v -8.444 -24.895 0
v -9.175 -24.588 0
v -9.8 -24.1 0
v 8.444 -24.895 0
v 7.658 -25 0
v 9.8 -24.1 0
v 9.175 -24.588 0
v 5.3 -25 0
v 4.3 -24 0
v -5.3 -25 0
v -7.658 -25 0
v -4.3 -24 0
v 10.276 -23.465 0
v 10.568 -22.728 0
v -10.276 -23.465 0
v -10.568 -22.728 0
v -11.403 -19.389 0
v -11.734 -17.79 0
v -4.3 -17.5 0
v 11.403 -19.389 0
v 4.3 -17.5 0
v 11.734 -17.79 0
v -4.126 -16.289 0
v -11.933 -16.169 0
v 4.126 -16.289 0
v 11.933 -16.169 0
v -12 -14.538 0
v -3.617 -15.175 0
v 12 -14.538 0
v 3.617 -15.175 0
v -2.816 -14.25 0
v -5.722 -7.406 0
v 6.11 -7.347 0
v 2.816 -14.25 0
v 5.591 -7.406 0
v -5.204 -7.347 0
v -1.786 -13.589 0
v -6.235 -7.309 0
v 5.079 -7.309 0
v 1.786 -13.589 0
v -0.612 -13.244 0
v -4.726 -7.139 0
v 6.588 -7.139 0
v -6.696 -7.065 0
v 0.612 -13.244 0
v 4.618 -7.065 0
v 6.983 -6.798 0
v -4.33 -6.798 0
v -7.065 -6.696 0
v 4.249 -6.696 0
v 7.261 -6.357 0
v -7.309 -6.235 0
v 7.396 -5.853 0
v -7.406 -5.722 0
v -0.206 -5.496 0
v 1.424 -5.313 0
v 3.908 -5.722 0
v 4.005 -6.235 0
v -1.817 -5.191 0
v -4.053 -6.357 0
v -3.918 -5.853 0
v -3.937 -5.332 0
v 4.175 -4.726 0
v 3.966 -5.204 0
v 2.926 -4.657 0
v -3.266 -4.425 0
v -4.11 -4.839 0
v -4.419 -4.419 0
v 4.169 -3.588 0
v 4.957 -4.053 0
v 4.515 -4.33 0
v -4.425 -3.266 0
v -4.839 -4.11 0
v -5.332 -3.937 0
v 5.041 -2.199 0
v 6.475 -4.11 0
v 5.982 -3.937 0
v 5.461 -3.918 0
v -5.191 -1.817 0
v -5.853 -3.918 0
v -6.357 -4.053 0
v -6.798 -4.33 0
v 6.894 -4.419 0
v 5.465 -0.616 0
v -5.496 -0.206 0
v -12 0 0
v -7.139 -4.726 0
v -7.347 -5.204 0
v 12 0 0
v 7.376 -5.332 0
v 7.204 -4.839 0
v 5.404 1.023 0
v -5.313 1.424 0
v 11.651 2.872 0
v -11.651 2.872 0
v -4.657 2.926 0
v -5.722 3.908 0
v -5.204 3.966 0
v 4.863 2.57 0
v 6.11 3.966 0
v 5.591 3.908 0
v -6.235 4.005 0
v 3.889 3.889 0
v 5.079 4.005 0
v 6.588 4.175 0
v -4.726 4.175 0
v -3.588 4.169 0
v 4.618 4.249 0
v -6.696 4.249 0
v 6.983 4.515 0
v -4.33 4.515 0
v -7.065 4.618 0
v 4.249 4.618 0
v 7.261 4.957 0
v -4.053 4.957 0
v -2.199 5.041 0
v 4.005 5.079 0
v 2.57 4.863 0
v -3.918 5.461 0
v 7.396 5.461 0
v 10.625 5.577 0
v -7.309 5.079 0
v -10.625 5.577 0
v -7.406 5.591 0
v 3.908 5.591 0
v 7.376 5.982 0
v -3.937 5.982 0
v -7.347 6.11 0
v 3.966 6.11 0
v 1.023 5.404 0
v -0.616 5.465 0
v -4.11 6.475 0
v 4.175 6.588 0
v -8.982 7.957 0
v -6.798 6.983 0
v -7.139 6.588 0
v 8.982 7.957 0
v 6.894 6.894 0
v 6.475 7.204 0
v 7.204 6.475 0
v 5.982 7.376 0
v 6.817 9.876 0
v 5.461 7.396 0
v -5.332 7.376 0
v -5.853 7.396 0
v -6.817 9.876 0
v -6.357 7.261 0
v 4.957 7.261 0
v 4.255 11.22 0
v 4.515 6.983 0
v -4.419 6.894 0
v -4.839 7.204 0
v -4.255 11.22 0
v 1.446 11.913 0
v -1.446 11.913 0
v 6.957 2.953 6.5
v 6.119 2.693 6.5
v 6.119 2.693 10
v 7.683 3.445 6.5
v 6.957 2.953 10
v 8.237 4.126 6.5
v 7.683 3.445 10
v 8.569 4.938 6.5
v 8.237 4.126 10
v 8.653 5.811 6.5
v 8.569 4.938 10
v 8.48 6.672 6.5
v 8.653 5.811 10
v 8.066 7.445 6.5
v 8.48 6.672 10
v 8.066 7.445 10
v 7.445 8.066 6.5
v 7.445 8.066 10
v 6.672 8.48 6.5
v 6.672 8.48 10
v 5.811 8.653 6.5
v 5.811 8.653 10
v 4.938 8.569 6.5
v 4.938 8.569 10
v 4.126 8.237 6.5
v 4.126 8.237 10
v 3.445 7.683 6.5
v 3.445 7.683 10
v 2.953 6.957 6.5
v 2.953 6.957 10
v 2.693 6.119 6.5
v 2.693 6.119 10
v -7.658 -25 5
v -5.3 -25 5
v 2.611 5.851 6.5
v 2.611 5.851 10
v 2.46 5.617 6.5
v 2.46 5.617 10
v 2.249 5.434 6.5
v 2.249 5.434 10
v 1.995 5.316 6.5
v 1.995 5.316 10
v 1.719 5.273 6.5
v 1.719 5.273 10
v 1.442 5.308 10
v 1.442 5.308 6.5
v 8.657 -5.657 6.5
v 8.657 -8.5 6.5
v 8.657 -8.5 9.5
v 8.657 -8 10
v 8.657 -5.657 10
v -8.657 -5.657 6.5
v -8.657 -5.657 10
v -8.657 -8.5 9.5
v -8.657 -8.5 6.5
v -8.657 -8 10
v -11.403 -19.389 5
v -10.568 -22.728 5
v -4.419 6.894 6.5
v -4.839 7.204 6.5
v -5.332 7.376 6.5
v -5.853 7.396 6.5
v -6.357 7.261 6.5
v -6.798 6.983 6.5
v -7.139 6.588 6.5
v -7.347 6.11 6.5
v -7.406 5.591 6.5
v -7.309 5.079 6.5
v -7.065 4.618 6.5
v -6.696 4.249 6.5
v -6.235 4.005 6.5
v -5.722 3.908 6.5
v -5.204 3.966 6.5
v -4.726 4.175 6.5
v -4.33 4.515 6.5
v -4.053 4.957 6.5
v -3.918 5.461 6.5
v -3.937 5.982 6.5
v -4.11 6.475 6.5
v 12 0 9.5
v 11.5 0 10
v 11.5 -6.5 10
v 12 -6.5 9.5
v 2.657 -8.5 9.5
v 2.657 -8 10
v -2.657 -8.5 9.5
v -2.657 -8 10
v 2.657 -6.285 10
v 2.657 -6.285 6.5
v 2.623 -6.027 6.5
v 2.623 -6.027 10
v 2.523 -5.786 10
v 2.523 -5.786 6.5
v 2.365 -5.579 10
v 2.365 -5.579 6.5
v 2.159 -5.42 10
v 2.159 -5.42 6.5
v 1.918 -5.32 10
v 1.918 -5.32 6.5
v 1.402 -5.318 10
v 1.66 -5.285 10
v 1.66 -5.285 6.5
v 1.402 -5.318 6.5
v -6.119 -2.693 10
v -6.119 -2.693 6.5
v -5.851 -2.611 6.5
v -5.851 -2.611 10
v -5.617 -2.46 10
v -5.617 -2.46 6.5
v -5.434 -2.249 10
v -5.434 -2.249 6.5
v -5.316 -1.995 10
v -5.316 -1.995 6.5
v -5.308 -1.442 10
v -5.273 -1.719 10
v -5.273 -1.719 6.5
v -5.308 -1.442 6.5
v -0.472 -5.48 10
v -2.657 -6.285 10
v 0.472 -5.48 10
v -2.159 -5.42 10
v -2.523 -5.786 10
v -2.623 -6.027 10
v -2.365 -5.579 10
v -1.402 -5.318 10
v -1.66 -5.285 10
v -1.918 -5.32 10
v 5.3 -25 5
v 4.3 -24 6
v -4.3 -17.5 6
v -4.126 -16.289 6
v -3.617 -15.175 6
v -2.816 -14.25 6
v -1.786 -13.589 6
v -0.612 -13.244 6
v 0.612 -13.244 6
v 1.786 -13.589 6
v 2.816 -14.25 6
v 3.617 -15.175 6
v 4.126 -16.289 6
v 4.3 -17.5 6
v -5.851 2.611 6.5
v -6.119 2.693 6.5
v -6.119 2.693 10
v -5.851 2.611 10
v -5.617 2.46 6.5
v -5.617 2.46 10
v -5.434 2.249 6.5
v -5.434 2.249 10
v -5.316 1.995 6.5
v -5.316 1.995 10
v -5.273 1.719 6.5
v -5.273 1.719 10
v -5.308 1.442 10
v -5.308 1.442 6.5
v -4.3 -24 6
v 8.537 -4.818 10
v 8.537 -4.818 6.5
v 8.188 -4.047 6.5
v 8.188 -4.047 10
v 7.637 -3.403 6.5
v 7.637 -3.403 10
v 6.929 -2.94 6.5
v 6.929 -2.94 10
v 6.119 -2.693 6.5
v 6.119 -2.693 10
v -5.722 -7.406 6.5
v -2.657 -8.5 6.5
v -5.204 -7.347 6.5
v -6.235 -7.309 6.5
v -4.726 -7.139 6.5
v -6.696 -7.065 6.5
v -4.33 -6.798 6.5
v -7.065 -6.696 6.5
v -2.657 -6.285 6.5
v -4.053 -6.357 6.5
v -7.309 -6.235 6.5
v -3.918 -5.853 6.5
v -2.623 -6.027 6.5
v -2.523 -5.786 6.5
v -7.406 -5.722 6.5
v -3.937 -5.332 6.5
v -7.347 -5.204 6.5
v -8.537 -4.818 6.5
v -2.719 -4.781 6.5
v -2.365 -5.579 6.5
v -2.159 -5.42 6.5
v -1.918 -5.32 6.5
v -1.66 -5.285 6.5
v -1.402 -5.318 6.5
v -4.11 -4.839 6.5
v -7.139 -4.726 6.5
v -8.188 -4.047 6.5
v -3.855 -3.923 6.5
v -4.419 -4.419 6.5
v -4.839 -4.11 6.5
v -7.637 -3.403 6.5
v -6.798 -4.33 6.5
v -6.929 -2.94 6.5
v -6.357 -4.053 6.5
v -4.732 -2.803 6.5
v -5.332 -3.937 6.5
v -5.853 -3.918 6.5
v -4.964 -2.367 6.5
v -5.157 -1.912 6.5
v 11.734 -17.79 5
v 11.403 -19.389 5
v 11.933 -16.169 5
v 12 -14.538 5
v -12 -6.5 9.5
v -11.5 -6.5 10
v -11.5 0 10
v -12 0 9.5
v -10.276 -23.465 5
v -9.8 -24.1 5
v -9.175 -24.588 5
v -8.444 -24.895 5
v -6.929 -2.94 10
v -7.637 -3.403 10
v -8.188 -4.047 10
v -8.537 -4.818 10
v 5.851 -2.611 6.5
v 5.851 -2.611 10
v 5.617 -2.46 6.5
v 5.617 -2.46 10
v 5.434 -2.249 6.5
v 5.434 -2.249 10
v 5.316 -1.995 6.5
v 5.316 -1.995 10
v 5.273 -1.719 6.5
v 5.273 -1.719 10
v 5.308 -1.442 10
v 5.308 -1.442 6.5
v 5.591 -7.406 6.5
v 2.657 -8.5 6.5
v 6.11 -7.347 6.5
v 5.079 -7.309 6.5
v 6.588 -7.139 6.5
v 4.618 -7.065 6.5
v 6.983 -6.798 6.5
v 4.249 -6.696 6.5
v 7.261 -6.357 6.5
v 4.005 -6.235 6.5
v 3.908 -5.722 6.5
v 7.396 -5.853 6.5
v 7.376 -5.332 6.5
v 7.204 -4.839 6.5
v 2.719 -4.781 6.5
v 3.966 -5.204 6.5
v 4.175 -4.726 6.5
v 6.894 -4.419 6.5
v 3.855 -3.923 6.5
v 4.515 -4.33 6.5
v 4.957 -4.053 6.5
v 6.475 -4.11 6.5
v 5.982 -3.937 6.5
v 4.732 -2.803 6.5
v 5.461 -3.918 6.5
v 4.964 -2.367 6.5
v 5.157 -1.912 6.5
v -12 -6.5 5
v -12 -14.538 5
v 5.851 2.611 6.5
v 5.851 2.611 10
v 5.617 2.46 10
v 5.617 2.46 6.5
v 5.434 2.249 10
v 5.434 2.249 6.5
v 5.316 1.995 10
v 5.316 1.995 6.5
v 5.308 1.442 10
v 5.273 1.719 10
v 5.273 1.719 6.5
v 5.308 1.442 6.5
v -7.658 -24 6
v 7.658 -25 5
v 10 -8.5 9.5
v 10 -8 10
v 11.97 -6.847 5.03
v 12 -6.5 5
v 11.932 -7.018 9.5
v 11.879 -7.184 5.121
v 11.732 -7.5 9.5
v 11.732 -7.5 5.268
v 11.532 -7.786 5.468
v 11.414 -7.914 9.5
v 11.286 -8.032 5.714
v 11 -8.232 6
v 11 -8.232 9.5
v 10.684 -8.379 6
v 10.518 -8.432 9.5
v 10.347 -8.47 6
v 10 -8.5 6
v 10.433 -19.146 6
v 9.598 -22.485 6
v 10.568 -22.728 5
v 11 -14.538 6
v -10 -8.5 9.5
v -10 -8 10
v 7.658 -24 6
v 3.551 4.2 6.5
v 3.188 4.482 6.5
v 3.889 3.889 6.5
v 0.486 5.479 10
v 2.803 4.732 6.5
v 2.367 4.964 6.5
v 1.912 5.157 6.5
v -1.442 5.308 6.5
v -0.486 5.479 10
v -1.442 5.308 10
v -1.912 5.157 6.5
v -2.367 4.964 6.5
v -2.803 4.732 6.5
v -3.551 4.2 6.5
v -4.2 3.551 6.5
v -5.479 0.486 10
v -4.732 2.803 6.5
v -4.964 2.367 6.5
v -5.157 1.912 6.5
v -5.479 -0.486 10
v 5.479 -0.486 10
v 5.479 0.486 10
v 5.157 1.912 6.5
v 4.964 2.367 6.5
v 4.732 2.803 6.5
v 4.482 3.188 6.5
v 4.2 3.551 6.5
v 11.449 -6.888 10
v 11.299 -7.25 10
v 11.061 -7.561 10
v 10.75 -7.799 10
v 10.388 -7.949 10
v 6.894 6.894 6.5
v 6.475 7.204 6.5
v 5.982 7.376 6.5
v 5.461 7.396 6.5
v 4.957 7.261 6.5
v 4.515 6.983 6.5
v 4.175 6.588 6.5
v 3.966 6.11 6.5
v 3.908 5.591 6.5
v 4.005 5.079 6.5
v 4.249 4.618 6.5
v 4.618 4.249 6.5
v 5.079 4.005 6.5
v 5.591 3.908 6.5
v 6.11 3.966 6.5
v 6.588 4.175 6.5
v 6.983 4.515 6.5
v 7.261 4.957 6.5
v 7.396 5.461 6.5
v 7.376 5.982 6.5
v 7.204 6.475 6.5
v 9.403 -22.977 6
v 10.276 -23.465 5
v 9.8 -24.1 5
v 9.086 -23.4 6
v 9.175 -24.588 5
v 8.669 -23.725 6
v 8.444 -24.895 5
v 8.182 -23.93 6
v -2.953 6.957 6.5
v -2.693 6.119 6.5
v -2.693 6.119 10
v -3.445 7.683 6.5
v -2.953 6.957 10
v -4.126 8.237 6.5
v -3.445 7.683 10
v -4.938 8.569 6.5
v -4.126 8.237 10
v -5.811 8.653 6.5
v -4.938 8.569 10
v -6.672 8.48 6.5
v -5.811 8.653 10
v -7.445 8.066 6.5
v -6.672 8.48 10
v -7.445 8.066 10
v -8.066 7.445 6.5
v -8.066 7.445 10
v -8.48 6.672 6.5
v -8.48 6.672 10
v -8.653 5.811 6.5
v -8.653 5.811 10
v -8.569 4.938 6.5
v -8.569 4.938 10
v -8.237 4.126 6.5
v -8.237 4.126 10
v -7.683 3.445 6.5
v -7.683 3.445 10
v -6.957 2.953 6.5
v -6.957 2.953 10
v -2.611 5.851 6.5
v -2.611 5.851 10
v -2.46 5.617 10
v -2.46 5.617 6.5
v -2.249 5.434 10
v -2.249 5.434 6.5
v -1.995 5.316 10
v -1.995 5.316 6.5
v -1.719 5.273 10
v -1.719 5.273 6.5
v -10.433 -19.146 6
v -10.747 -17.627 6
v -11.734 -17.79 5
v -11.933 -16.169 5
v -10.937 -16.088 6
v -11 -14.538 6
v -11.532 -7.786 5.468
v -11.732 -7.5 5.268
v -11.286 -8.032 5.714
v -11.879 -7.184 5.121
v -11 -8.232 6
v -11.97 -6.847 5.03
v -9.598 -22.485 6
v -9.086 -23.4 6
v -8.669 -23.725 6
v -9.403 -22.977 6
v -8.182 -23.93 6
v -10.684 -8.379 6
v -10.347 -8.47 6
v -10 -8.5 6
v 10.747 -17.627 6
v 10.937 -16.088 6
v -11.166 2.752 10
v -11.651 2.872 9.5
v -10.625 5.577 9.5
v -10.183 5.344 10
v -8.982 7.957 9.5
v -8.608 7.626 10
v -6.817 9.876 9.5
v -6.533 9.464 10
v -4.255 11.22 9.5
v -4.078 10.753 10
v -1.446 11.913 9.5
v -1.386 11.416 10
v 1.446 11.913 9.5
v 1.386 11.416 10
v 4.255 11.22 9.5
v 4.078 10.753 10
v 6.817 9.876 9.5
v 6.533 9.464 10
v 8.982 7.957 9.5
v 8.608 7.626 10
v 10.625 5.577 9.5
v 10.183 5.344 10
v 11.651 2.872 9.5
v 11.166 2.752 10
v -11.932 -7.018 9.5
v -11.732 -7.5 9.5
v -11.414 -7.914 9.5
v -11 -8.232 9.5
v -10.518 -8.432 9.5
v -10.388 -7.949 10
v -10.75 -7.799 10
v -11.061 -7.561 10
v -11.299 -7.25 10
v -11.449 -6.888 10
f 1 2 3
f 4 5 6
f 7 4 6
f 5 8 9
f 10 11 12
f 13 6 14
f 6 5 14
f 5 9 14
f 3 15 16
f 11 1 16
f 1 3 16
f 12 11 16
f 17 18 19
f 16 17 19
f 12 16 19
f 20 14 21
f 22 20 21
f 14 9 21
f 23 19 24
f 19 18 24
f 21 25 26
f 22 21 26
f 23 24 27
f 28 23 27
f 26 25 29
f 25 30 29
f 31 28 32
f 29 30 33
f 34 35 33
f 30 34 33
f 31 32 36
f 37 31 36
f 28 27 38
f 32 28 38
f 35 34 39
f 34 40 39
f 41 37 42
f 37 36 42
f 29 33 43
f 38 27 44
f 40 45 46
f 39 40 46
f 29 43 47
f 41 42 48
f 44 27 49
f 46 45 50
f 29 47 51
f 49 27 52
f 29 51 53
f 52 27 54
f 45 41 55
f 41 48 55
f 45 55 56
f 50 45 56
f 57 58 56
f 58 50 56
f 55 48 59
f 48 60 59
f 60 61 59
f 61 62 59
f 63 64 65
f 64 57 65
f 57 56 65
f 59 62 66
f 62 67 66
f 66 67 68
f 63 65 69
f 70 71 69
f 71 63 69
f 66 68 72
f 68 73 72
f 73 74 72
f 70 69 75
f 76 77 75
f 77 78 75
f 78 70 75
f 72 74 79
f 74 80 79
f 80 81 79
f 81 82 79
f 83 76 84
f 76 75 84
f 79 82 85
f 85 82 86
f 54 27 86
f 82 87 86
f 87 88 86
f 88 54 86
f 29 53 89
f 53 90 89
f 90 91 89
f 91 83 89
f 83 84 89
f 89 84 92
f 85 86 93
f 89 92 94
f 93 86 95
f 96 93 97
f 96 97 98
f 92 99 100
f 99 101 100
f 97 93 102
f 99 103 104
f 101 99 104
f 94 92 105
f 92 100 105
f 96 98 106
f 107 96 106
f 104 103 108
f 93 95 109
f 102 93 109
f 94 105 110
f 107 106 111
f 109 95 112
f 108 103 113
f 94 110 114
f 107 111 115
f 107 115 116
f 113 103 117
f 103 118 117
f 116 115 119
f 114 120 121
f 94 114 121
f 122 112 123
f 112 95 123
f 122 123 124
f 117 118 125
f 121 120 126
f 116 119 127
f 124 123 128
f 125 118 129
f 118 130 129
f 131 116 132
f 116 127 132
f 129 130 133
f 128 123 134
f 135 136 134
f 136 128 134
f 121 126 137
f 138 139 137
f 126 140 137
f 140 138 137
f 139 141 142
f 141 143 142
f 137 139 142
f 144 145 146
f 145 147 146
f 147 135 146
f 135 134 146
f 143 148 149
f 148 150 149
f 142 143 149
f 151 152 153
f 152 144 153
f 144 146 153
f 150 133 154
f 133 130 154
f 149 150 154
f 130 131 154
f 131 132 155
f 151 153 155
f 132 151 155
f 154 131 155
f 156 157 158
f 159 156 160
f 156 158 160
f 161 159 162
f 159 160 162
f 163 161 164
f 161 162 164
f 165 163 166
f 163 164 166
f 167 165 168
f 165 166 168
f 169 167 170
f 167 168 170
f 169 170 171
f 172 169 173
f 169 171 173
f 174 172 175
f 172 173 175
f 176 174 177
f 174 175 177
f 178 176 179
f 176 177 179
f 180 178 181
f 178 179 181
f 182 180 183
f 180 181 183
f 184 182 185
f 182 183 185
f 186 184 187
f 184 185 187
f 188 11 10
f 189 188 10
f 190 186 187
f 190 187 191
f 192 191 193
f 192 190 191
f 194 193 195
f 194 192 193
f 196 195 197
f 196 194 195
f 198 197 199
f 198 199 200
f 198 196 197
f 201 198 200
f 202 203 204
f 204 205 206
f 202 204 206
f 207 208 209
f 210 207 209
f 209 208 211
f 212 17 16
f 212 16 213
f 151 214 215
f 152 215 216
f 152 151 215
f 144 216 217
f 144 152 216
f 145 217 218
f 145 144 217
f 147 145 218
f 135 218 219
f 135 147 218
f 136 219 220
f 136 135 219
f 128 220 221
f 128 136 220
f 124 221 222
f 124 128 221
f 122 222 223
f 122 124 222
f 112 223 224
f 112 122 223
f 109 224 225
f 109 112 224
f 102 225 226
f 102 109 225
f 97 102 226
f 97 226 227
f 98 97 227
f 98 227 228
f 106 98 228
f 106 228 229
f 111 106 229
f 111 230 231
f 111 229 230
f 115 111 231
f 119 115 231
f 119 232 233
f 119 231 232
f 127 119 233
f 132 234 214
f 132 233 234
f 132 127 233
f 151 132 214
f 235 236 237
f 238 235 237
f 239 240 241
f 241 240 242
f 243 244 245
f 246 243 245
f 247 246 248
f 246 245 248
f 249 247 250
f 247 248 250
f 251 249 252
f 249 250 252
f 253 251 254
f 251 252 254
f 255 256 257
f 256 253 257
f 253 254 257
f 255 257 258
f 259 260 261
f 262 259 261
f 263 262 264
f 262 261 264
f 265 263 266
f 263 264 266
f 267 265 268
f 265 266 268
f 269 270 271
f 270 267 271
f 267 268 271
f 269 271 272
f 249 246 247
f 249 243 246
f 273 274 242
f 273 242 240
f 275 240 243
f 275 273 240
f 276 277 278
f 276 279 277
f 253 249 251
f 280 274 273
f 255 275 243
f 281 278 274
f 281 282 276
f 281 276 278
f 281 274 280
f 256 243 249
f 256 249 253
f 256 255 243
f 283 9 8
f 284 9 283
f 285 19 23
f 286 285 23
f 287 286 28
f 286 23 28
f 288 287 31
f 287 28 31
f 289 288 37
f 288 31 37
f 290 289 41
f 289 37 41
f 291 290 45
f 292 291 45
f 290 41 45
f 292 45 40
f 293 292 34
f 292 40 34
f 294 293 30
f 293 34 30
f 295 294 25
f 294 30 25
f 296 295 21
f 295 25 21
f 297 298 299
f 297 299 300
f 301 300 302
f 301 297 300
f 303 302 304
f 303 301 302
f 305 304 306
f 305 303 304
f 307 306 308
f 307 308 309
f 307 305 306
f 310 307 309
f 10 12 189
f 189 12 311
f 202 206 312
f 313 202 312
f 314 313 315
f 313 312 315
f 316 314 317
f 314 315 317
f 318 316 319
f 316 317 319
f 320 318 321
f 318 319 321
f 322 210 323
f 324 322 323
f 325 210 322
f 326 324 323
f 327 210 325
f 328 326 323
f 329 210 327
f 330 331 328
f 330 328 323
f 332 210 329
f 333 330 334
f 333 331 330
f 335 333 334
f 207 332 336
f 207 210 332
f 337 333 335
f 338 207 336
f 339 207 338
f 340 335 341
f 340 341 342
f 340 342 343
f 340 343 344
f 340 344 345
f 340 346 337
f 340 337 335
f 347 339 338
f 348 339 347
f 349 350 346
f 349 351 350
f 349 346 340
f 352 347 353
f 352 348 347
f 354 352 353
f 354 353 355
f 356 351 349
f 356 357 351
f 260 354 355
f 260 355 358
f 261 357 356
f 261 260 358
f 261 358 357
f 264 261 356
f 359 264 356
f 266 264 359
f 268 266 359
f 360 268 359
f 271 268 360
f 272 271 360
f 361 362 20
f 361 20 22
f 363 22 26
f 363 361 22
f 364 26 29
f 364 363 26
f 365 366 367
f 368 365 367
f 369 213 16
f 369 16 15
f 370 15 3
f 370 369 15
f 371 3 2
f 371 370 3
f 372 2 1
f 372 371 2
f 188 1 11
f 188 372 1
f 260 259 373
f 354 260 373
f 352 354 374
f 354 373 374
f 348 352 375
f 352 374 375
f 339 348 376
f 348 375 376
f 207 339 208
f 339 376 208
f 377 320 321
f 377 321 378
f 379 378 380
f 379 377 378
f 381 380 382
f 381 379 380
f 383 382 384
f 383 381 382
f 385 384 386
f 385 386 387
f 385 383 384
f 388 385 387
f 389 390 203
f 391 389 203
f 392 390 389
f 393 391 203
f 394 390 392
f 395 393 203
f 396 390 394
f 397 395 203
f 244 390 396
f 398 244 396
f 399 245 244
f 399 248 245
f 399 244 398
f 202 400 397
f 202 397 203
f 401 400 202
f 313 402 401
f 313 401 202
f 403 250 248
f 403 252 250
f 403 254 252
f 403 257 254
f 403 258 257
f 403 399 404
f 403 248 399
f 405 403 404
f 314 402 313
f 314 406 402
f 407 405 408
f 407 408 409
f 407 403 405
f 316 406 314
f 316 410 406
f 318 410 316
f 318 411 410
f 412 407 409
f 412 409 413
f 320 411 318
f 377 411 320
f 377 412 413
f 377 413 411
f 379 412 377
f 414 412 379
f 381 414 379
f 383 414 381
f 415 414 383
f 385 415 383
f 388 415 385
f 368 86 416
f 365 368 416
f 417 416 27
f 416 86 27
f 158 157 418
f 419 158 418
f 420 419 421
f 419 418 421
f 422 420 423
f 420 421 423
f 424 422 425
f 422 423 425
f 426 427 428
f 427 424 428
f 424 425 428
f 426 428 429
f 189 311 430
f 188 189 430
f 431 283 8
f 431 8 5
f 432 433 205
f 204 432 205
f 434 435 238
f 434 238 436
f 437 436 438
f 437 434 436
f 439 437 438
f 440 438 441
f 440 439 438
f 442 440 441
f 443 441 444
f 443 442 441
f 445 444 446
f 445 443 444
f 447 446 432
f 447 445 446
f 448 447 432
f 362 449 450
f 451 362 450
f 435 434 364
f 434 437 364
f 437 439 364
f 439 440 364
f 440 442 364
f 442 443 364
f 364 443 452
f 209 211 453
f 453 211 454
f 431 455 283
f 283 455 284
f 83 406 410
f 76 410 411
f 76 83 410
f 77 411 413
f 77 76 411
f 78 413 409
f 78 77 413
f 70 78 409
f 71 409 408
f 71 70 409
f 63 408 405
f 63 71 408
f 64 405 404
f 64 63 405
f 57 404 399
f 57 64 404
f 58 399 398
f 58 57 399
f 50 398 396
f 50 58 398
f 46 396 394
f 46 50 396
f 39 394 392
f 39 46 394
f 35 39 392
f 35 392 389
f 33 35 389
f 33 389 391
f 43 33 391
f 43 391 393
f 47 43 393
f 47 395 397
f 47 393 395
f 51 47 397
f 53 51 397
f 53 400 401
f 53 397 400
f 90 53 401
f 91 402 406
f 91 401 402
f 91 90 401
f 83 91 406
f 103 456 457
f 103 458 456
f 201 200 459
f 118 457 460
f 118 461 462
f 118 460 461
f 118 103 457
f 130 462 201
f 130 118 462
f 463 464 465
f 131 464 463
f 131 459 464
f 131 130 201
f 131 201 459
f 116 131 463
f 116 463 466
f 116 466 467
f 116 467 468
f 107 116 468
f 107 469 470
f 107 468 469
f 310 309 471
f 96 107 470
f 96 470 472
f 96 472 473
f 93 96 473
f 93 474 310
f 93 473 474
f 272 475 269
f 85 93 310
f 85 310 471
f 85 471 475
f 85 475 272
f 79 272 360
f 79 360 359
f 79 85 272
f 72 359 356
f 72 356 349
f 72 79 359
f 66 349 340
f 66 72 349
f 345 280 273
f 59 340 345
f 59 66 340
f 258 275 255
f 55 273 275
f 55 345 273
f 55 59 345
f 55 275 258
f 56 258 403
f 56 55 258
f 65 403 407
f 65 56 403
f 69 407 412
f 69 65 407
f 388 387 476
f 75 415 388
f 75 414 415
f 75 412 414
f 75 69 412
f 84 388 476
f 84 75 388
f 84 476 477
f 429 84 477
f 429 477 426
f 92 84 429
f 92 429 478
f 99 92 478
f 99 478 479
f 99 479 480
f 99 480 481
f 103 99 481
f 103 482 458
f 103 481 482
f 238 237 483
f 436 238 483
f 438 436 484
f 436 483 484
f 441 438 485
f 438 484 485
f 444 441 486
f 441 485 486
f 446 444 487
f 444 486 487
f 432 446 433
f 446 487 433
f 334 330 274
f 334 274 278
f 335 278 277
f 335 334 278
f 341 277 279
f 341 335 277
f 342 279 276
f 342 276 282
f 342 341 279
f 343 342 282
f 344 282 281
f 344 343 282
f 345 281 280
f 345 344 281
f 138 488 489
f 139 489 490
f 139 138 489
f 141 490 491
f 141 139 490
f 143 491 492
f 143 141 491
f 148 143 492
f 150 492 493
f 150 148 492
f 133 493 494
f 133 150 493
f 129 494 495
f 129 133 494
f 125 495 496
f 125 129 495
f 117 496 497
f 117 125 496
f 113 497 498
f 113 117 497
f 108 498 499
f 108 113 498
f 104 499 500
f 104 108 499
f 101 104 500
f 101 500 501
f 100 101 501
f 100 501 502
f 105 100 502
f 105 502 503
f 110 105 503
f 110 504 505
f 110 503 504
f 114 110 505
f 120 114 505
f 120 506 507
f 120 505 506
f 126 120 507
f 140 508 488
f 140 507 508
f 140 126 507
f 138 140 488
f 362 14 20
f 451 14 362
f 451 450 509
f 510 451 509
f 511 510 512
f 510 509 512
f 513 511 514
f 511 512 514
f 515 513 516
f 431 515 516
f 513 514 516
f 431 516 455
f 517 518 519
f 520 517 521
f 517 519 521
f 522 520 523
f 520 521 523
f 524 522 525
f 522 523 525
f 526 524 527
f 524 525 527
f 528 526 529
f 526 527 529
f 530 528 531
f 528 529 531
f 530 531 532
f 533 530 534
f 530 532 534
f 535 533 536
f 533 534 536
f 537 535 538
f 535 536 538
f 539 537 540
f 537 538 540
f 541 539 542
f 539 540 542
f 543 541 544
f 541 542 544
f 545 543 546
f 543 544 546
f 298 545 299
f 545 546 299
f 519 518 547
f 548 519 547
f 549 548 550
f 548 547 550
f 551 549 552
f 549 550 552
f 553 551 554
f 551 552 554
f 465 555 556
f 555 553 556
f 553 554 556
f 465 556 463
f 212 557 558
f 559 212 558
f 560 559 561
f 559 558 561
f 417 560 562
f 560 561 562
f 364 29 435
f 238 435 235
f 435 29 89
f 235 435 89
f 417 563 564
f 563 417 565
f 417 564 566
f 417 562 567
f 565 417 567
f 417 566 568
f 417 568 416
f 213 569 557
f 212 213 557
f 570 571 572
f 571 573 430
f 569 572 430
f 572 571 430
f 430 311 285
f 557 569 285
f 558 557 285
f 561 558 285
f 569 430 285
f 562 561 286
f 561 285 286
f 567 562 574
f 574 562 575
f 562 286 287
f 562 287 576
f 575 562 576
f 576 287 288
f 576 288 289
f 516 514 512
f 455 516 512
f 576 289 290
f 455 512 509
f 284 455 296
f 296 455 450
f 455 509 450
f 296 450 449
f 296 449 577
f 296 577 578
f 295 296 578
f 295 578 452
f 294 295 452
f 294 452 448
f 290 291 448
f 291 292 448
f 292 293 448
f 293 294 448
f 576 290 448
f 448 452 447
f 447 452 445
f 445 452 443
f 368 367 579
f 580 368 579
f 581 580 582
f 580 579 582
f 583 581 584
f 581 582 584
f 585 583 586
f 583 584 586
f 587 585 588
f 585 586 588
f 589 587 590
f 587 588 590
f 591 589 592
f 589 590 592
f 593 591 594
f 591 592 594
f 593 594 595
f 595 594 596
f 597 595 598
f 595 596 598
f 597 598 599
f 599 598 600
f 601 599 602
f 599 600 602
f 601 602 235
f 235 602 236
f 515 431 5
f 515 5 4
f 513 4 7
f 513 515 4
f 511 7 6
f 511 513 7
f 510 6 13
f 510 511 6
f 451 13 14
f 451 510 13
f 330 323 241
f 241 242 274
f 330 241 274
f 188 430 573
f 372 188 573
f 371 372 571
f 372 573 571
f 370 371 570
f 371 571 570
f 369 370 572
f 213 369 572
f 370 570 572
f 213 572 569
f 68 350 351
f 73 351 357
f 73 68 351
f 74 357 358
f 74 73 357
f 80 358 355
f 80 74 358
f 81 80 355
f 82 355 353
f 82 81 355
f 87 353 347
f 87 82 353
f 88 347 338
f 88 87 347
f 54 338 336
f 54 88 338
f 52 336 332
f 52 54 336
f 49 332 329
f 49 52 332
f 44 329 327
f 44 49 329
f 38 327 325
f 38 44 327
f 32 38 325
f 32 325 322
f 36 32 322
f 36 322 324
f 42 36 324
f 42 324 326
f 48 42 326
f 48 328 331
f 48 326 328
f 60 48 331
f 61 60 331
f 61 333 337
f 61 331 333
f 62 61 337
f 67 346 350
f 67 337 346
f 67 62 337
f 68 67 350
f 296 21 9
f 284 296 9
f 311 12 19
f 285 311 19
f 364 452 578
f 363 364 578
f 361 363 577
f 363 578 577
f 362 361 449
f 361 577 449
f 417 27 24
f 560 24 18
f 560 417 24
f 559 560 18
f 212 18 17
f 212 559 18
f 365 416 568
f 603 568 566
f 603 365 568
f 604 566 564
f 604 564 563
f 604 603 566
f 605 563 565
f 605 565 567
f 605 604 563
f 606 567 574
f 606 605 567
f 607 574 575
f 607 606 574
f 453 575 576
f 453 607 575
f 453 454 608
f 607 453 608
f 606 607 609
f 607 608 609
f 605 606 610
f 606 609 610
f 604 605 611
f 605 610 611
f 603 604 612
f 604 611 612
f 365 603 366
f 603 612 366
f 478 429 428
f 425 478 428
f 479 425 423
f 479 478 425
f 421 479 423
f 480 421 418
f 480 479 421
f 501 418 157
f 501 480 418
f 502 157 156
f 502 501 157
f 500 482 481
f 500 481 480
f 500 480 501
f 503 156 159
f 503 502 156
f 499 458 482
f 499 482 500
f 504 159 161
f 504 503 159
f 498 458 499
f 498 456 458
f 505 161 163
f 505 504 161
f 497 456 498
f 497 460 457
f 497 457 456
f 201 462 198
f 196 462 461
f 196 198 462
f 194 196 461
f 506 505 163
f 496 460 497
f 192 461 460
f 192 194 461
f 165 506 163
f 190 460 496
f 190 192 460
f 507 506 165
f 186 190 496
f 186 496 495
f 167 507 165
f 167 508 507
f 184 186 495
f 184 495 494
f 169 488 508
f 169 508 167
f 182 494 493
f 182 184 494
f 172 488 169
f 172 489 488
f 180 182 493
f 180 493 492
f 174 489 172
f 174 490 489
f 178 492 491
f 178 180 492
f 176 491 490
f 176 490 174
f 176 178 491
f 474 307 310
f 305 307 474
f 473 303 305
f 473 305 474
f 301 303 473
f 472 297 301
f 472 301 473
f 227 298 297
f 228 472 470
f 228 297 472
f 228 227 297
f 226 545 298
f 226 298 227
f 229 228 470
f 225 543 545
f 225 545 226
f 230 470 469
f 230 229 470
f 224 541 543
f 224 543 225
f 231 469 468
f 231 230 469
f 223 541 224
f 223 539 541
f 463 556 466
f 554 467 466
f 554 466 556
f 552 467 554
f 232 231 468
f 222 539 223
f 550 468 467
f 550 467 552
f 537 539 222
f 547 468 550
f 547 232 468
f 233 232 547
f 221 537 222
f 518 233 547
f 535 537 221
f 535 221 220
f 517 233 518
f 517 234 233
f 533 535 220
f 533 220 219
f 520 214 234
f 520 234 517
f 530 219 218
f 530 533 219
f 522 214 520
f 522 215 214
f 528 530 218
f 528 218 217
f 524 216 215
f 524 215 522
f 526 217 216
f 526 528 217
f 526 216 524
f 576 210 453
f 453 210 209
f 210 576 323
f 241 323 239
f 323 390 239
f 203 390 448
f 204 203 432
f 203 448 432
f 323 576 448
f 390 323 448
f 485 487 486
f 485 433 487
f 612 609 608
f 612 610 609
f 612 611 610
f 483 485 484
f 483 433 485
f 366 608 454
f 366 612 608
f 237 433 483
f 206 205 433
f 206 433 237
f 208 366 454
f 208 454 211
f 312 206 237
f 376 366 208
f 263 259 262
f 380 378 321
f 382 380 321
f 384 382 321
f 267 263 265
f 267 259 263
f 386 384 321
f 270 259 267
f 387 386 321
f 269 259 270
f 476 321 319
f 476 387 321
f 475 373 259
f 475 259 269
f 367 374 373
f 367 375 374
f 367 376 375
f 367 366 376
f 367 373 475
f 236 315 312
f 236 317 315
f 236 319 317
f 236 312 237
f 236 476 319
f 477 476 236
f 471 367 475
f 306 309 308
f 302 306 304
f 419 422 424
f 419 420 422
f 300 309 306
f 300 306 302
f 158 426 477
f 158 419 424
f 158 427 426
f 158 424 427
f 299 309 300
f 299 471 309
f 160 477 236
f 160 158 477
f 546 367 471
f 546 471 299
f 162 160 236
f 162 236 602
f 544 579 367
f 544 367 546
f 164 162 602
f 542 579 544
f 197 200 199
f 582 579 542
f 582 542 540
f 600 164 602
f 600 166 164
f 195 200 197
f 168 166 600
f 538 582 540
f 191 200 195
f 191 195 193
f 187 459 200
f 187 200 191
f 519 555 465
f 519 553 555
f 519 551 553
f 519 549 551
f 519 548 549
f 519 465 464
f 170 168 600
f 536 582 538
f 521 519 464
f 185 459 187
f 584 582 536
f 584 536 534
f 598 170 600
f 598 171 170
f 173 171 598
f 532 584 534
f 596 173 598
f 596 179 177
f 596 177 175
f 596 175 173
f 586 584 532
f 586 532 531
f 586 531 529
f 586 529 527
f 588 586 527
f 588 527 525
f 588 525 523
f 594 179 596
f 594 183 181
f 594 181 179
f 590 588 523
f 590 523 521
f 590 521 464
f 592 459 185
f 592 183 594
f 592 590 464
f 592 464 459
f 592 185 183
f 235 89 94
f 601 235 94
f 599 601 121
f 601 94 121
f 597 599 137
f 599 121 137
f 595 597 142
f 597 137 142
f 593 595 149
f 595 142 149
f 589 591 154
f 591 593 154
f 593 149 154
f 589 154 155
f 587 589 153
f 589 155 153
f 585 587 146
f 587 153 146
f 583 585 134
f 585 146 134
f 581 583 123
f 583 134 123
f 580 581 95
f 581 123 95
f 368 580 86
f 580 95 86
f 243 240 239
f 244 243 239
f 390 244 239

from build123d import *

# Parameters (mm, degrees)
F0_R        = 1.75
F0_R_2      = 5.5
F1_DEPTH    = 10
F2_SIZE2    = 8
F2_SIZE     = 2
F3_SIZE2    = 2
F3_SIZE     = 8
F5_W        = 20
F5_H        = 8
F6_DEPTH    = 15
F7_R        = 3
F8_DEPTH    = 3.5
F9_T1_DEPTH = 7.3998501729
F9_T3_DEPTH = 7.1931423334
F10_R       = 2
F11_SIZE    = 0.5
F12_SIZE    = 1
F13_R       = 3
F14_R       = 20
F15_SIZE    = 1
F17_ANGLE   = 45


# Not quite as in the source:
# - a fillet or chamfer that OpenCascade refuses, or shapes differently, is made with other operations: its cross-section is extruded or revolved along the edge and cut away or added


with BuildPart() as f1:
    # F0 (on Top) → F1 (new body)
    with BuildSketch(Plane.XY):
        with BuildLine():
            Line((-9.1923881554, -26.1629509039), (8.4852813742, -8.4852813742))
            ThreePointArc((8.4852813742, -8.4852813742), (8.4852813742, 8.4852813742), (-8.4852813742, 8.4852813742))
            Line((-8.4852813742, 8.4852813742), (-26.1629509039, -9.1923881554))
            Line((-26.1629509039, -9.1923881554), (-20.7182286888, -14.6371103706))
            Line((-20.7182286888, -14.6371103706), (-15.4149278299, -9.3338095117))
            ThreePointArc((-15.4149278299, -9.3338095117), (-9.3338095117, -9.3338095117), (-9.3338095117, -15.4149278299))
            Line((-9.3338095117, -15.4149278299), (-14.6371103706, -20.7182286888))
            Line((-14.6371103706, -20.7182286888), (-9.1923881554, -26.1629509039))
        make_face()
        with Locations((0, -8)):
            Circle(F0_R, mode=Mode.SUBTRACT)
        with Locations((-8, 0)):
            Circle(F0_R, mode=Mode.SUBTRACT)
        Circle(F0_R_2, mode=Mode.SUBTRACT)
        with Locations((8, 0)):
            Circle(F0_R, mode=Mode.SUBTRACT)
        with Locations((0, 8)):
            Circle(F0_R, mode=Mode.SUBTRACT)
    extrude(amount=F1_DEPTH)

    # F2
    f2_edges = [f1.edges().sort_by_distance(p)[0] for p in [
        (-26.162951, -9.192388, 5),
    ]]
    f2_side = f1.faces().sort_by_distance((-23.44059, -11.914749, 5))[0]
    chamfer(f2_edges, length=F2_SIZE, length2=F2_SIZE2, reference=f2_side)

    # F3
    f3_edges = [f1.edges().sort_by_distance(p)[0] for p in [
        (-9.192388, -26.162951, 5),
    ]]
    f3_side = f1.faces().sort_by_distance((-0.353553, -17.324116, 5))[0]
    chamfer(f3_edges, length=F3_SIZE, length2=F3_SIZE2, reference=f3_side)

    # F5 (on offset) → F6 (cut, symmetric)
    with BuildSketch(Plane(origin=(0.5303300859, -0.5303300859, 0), x_dir=(0.7071067812, 0.7071067812, 0), z_dir=(0.7071067812, -0.7071067812, 0))):
        with Locations((-18.5, 10)):
            Rectangle(F5_W, F5_H)
    extrude(amount=F6_DEPTH, both=True, mode=Mode.SUBTRACT)

    # F7 (on face) → F8 (cut)
    with BuildSketch(Plane.XY.offset(10)):
        with BuildLine():
            Line((-7.8890872965, -4.1317279836), (-5.8786796564, -2.1213203436))
            ThreePointArc((-5.8786796564, -2.1213203436), (-5.8786796564, 2.1213203436), (-10.1213203436, 2.1213203436))
            Line((-10.1213203436, 2.1213203436), (-12.1317279836, 0.1109127035))
            Line((-12.1317279836, 0.1109127035), (-7.8890872965, -4.1317279836))
        make_face()
        with BuildLine():
            Line((0.1109127035, -12.1317279836), (2.1213203436, -10.1213203436))
            ThreePointArc((2.1213203436, -10.1213203436), (2.1213203436, -5.8786796564), (-2.1213203436, -5.8786796564))
            Line((-2.1213203436, -5.8786796564), (-4.1317279836, -7.8890872965))
            Line((-4.1317279836, -7.8890872965), (0.1109127035, -12.1317279836))
        make_face()
        with Locations((8, 0)):
            Circle(F7_R)
        with Locations((0, 8)):
            Circle(F7_R)
    extrude(amount=-F8_DEPTH, mode=Mode.SUBTRACT)

    # F9: fillet of radius 1 on 8 edges, made by hand

    # F9_s2 → F9_t1 (cut)
    with BuildSketch(Plane.XY.offset(6.5)):
        with BuildLine():
            ThreePointArc((-6.3230487903, -2.5656894774), (-5.4874259536, -2.2810888302), (-4.7519509308, -2.7692891419))
            Line((-4.7519509308, -2.7692891419), (-4.665551823, -2.7189384302))
            ThreePointArc((-4.665551823, -2.7189384302), (-4.9962431034, -2.0487935111), (-5.23125, -1.3394116012))
            Line((-5.23125, -1.3394116012), (-5.4171875, -1.3187416691))
            ThreePointArc((-5.4171875, -1.3187416691), (-5.9493903346, -2.0506096654), (-6.3937594684, -2.4949787993))
            Line((-6.3937594684, -2.4949787993), (-6.3230487903, -2.5656894774))
        make_face()
        with BuildLine():
            ThreePointArc((-2.5656894774, -6.3230487903), (-2.2810888302, -5.4874259536), (-2.7692891419, -4.7519509308))
            Line((-2.7692891419, -4.7519509308), (-2.7189384302, -4.665551823))
            ThreePointArc((-2.7189384302, -4.665551823), (-2.0487935111, -4.9962431034), (-1.3394116012, -5.23125))
            Line((-1.3394116012, -5.23125), (-1.3187416691, -5.4171875))
            ThreePointArc((-1.3187416691, -5.4171875), (-2.0506096654, -5.9493903346), (-2.4949787993, -6.3937594684))
            Line((-2.4949787993, -6.3937594684), (-2.5656894774, -6.3230487903))
        make_face()
    extrude(amount=F9_T1_DEPTH, mode=Mode.SUBTRACT)

    # F9_s4 → F9_t3 (cut)
    with BuildSketch(Plane.XY.offset(6.5)):
        with BuildLine():
            ThreePointArc((-6.23046875, 2.4225521987), (-5.4322290759, 2.2520250497), (-4.7728365385, 2.7331358139))
            ThreePointArc((-4.7728365385, 2.7331358139), (-5.0966500462, 2.06740376), (-5.328125, 1.3642155198))
            ThreePointArc((-5.328125, 1.3642155198), (-5.717119911, 1.9463962852), (-6.23046875, 2.4225521987))
        make_face()
        with BuildLine():
            ThreePointArc((2.4225521987, -6.23046875), (2.2520250497, -5.4322290759), (2.7331358139, -4.7728365385))
            ThreePointArc((2.7331358139, -4.7728365385), (2.06740376, -5.0966500462), (1.3642155198, -5.328125))
            ThreePointArc((1.3642155198, -5.328125), (1.9463962852, -5.717119911), (2.4225521987, -6.23046875))
        make_face()
        with BuildLine():
            ThreePointArc((6.23046875, -2.4225521987), (5.4322290759, -2.2520250497), (4.7728365385, -2.7331358139))
            ThreePointArc((4.7728365385, -2.7331358139), (5.0966500462, -2.06740376), (5.328125, -1.3642155198))
            ThreePointArc((5.328125, -1.3642155198), (5.717119911, -1.9463962852), (6.23046875, -2.4225521987))
        make_face()
        with BuildLine():
            ThreePointArc((6.23046875, 2.4225521987), (5.4322290759, 2.2520250497), (4.7728365385, 2.7331358139))
            ThreePointArc((4.7728365385, 2.7331358139), (5.0966500462, 2.06740376), (5.328125, 1.3642155198))
            ThreePointArc((5.328125, 1.3642155198), (5.717119911, 1.9463962852), (6.23046875, 2.4225521987))
        make_face()
        with BuildLine():
            ThreePointArc((-2.4225521987, 6.23046875), (-2.2520250497, 5.4322290759), (-2.7331358139, 4.7728365385))
            ThreePointArc((-2.7331358139, 4.7728365385), (-2.06740376, 5.0966500462), (-1.3642155198, 5.328125))
            ThreePointArc((-1.3642155198, 5.328125), (-1.9463962852, 5.717119911), (-2.4225521987, 6.23046875))
        make_face()
        with BuildLine():
            ThreePointArc((2.4225521987, 6.23046875), (2.2520250497, 5.4322290759), (2.7331358139, 4.7728365385))
            ThreePointArc((2.7331358139, 4.7728365385), (2.06740376, 5.0966500462), (1.3642155198, 5.328125))
            ThreePointArc((1.3642155198, 5.328125), (1.9463962852, 5.717119911), (2.4225521987, 6.23046875))
        make_face()
    extrude(amount=F9_T3_DEPTH, mode=Mode.SUBTRACT)

    # F10
    f10_edges = [f1.edges().sort_by_distance(p)[0] for p in [
        (2.474874, -14.495689, 8),
        (-14.495689, 2.474874, 8),
    ]]
    fillet(f10_edges, radius=F10_R)

    # F11
    f11_edges = [f1.edges().sort_by_distance(p)[0] for p in [
        (0.585786, -12.606602, 10),
        (-12.606602, 0.585786, 10),
        (-6.010408, -6.010408, 10),
        (2.474874, -13.667262, 10),
        (-13.667262, 2.474874, 10),
        (6.187184, -10.783378, 10),
        (8.485281, 8.485281, 10),
        (-10.783378, 6.187184, 10),
    ]]
    chamfer(f11_edges, length=F11_SIZE)

    # F12
    f12_edges = [f1.edges().sort_by_distance(p)[0] for p in [
        (-20.718229, -14.63711, 3),
        (-14.63711, -20.718229, 3),
    ]]
    chamfer(f12_edges, length=F12_SIZE)

    # F13
    f13_edges = [f1.edges().sort_by_distance(p)[0] for p in [
        (-10.606602, -24.748737, 3),
        (-24.748737, -10.606602, 3),
    ]]
    fillet(f13_edges, radius=F13_R)

    # F14
    f14_edges = [f1.edges().sort_by_distance(p)[0] for p in [
        (-3.535534, -20.506097, 3),
        (-20.506097, -3.535534, 3),
    ]]
    fillet(f14_edges, radius=F14_R)

    # F15
    f15_edges = [f1.edges().sort_by_distance(p)[0] for p in [
        (-13.096441, -22.258898, 6),
        (-10.508108, -23.948663, 6),
        (-7.122424, -22.658231, 6),
        (-3.628449, -20.387093, 6),
        (0.340158, -16.630405, 6),
        (-22.258898, -13.096441, 6),
        (-23.948663, -10.508108, 6),
        (-22.658231, -7.122424, 6),
    ]]
    chamfer(f15_edges, length=F15_SIZE)


with BuildPart() as f1_1:
    # F17: moved
    add(f1.part.rotate(Axis((0, 0, 12.5), (0, 0, 1)), F17_ANGLE))


solid = f1_1.part
